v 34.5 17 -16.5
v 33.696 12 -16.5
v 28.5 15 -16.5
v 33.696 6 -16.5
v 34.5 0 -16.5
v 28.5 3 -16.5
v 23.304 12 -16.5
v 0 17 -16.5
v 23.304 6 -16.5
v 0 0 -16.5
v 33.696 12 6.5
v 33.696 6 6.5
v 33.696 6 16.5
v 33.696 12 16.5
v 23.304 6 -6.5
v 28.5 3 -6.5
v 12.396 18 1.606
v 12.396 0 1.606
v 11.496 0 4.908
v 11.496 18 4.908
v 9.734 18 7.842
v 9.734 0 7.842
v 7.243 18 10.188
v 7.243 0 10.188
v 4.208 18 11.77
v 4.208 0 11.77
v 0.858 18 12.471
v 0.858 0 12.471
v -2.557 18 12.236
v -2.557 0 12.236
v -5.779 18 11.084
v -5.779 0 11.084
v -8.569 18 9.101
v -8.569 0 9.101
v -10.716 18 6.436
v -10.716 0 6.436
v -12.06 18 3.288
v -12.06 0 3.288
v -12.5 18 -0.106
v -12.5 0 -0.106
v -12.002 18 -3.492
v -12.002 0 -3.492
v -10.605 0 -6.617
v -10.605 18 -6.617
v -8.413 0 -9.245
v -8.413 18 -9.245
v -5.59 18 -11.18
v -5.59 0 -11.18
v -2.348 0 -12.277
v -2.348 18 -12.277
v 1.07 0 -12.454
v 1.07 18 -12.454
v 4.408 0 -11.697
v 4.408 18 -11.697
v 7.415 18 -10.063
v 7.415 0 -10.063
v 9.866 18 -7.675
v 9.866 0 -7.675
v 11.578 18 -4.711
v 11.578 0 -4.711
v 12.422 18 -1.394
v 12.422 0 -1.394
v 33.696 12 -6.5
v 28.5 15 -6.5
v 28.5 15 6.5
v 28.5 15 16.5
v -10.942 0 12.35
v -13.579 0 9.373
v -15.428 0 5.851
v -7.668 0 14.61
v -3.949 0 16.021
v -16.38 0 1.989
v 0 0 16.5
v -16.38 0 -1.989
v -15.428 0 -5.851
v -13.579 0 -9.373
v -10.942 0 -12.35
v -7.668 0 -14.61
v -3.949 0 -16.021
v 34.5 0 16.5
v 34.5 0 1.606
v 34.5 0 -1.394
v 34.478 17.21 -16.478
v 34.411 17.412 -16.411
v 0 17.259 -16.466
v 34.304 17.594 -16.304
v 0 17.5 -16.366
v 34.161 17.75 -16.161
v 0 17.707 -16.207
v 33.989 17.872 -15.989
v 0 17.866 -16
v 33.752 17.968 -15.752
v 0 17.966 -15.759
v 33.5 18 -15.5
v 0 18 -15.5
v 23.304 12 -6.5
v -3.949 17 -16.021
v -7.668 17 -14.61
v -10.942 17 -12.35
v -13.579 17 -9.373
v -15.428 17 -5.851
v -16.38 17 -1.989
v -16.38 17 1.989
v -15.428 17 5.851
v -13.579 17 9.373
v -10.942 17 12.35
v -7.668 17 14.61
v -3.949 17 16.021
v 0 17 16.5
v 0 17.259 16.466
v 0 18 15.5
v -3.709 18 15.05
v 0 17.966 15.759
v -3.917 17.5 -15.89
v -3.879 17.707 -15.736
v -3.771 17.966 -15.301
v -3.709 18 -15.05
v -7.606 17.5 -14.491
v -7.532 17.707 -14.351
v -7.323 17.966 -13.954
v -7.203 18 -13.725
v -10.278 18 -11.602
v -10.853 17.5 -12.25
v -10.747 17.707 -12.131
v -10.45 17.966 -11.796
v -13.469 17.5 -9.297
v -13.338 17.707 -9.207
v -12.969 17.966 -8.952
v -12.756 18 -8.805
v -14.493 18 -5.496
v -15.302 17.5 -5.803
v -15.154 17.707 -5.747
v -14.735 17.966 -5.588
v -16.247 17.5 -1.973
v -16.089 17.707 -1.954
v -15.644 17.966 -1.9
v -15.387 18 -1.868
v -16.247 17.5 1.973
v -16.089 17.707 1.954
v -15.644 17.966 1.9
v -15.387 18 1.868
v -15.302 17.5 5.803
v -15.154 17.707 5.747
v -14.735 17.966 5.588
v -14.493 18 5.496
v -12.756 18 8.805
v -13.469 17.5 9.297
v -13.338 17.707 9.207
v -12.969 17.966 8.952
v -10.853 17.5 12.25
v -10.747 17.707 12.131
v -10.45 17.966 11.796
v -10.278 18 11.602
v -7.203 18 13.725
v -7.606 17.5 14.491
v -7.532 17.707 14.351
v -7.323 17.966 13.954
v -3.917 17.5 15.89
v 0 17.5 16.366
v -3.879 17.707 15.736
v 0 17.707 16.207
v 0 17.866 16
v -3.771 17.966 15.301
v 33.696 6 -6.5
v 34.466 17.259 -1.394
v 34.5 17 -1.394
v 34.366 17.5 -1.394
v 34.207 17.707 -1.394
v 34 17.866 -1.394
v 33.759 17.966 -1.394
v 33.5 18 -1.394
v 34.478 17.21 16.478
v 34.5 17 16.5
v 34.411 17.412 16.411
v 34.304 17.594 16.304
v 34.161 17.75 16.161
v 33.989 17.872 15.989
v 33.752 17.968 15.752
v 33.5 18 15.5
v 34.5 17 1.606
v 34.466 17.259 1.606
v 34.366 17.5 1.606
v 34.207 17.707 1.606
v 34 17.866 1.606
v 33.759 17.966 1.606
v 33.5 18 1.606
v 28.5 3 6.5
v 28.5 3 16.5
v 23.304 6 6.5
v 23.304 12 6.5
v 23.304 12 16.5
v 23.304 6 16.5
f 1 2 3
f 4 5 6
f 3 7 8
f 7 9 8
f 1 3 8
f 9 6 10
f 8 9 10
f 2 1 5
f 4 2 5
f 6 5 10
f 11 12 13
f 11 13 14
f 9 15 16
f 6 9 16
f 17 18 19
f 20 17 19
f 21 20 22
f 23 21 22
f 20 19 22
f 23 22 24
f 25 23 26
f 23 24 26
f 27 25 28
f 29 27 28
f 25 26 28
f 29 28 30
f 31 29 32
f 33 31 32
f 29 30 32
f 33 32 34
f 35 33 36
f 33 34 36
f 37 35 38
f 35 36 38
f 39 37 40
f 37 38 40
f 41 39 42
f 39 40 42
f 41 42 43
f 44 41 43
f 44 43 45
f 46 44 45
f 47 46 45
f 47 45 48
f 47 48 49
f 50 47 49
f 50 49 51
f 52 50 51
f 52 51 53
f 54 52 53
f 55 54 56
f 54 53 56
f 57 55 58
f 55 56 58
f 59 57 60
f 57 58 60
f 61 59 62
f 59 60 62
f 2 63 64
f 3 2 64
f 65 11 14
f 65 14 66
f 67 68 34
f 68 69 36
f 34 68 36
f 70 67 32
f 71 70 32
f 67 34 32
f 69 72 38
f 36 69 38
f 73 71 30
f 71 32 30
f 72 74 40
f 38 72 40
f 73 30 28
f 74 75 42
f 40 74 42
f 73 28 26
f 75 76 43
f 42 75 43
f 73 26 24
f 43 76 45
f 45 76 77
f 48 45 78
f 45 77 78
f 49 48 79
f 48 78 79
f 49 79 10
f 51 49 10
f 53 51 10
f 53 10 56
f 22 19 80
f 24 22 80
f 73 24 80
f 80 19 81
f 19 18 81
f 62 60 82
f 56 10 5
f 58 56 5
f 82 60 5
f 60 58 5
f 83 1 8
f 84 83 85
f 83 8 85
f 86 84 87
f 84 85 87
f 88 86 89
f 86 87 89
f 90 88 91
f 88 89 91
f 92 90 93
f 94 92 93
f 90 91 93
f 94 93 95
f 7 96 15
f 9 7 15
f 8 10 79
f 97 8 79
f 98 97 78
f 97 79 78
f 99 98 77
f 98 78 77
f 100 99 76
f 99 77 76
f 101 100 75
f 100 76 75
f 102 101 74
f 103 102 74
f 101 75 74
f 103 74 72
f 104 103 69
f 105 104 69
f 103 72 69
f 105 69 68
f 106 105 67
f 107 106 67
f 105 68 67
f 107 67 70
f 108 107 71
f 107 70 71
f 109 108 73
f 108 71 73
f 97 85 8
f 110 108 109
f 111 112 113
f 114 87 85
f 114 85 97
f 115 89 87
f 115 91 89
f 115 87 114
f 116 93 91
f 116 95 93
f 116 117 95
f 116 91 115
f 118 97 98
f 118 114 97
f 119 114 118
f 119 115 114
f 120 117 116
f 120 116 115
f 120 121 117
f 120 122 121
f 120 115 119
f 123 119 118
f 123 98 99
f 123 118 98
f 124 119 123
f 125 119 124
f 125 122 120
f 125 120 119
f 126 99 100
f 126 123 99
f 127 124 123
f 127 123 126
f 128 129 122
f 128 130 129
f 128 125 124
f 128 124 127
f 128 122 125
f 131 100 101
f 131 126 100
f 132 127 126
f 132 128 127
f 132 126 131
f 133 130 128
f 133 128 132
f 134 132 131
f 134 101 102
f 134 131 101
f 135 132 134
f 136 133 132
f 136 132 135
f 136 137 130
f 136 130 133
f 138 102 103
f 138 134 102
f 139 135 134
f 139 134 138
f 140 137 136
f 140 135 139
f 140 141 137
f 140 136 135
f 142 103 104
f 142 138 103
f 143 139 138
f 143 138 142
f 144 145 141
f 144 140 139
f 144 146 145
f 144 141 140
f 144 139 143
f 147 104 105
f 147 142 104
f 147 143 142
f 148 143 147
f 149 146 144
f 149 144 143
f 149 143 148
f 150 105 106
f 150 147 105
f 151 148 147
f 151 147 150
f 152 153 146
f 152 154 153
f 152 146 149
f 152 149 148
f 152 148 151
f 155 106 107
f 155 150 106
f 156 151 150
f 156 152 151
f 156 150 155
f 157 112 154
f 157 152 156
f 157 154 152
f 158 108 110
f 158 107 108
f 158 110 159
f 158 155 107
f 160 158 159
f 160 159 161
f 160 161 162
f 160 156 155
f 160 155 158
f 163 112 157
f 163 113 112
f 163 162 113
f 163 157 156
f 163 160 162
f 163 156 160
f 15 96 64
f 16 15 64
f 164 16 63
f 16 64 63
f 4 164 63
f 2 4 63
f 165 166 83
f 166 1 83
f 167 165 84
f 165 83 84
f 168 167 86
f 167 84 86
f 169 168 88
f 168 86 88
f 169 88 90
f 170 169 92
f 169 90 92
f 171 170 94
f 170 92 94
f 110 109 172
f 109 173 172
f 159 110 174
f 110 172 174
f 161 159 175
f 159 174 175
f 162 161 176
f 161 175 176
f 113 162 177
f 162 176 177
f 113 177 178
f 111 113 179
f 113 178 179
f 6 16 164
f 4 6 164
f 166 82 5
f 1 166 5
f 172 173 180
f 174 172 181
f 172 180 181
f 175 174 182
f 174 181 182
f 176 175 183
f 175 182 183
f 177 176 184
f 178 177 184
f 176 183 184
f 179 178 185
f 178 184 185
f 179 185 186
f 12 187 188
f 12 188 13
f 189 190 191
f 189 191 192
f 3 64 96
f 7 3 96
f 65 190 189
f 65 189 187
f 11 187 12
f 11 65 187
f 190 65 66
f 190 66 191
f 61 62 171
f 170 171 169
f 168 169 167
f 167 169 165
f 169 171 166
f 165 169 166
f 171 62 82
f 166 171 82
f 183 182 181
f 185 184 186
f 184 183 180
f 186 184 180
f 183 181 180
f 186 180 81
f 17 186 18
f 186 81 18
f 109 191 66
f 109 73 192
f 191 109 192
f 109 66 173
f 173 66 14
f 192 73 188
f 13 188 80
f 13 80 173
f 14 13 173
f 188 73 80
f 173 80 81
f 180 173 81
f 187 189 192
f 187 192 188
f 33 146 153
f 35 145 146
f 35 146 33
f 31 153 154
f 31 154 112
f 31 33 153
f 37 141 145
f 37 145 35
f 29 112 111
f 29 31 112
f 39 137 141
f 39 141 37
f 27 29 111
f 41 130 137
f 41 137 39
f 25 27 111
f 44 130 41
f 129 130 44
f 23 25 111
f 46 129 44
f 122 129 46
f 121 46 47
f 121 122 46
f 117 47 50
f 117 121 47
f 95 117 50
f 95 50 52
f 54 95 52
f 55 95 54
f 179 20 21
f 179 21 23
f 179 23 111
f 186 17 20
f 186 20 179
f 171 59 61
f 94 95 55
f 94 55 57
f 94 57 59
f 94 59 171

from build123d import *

# Parameters (mm, degrees)
BOSS_EXTRUDE1_DEPTH = 18
FILLET1_R           = 1
CUT_EXTRUDE1_START  = -10
CUT_EXTRUDE1_DEPTH  = 62.022054055


with BuildPart() as part:
    # Sketch1 → Boss-Extrude1 (new body)
    with BuildSketch(Plane(origin=(0, 0, 0), x_dir=(1, 0, 0), z_dir=(0, 1, 0))):
        with BuildLine():
            Line((0, -16.5), (34.5, -16.5))
            Line((34.5, -16.5), (34.5, -1.605540399))
            Line((34.5, -1.605540399), (12.396460786, -1.605540399))
            ThreePointArc((12.396460786, -1.605540399), (-12.499547931, 0.106308653), (12.421975786, 1.394459601))
            Line((12.421975786, 1.394459601), (34.5, 1.394459601))
            Line((34.5, 1.394459601), (34.5, 16.5))
            Line((34.5, 16.5), (0, 16.5))
            ThreePointArc((0, 16.5), (-16.5, 0), (0, -16.5))
        make_face()
    extrude(amount=BOSS_EXTRUDE1_DEPTH)

    # Fillet1
    fillet1_edges = [part.edges().sort_by_distance(p)[0] for p in [
        (17.25, 18, -16.5),
        (-16.5, 18, 0),
        (17.25, 18, 16.5),
        (34.5, 18, 9.0527702),
        (34.5, 18, -8.9472298),
    ]]
    fillet(fillet1_edges, radius=FILLET1_R)

    # Sketch2 → Cut-Extrude1 (cut)
    with BuildSketch(Plane.XY.offset(16.5).offset(CUT_EXTRUDE1_START)):
        Polygon((28.5, 15), (23.303847577, 12), (23.303847577, 6), (28.5, 3), (33.696152423, 6), (33.696152423, 12), align=None)
    cut_extrude1 = extrude(amount=CUT_EXTRUDE1_DEPTH, mode=Mode.SUBTRACT)

    # Mirror1: Cut-Extrude1 across plane
    add(cut_extrude1.mirror(Plane.XY), mode=Mode.SUBTRACT)


solid = part.part
